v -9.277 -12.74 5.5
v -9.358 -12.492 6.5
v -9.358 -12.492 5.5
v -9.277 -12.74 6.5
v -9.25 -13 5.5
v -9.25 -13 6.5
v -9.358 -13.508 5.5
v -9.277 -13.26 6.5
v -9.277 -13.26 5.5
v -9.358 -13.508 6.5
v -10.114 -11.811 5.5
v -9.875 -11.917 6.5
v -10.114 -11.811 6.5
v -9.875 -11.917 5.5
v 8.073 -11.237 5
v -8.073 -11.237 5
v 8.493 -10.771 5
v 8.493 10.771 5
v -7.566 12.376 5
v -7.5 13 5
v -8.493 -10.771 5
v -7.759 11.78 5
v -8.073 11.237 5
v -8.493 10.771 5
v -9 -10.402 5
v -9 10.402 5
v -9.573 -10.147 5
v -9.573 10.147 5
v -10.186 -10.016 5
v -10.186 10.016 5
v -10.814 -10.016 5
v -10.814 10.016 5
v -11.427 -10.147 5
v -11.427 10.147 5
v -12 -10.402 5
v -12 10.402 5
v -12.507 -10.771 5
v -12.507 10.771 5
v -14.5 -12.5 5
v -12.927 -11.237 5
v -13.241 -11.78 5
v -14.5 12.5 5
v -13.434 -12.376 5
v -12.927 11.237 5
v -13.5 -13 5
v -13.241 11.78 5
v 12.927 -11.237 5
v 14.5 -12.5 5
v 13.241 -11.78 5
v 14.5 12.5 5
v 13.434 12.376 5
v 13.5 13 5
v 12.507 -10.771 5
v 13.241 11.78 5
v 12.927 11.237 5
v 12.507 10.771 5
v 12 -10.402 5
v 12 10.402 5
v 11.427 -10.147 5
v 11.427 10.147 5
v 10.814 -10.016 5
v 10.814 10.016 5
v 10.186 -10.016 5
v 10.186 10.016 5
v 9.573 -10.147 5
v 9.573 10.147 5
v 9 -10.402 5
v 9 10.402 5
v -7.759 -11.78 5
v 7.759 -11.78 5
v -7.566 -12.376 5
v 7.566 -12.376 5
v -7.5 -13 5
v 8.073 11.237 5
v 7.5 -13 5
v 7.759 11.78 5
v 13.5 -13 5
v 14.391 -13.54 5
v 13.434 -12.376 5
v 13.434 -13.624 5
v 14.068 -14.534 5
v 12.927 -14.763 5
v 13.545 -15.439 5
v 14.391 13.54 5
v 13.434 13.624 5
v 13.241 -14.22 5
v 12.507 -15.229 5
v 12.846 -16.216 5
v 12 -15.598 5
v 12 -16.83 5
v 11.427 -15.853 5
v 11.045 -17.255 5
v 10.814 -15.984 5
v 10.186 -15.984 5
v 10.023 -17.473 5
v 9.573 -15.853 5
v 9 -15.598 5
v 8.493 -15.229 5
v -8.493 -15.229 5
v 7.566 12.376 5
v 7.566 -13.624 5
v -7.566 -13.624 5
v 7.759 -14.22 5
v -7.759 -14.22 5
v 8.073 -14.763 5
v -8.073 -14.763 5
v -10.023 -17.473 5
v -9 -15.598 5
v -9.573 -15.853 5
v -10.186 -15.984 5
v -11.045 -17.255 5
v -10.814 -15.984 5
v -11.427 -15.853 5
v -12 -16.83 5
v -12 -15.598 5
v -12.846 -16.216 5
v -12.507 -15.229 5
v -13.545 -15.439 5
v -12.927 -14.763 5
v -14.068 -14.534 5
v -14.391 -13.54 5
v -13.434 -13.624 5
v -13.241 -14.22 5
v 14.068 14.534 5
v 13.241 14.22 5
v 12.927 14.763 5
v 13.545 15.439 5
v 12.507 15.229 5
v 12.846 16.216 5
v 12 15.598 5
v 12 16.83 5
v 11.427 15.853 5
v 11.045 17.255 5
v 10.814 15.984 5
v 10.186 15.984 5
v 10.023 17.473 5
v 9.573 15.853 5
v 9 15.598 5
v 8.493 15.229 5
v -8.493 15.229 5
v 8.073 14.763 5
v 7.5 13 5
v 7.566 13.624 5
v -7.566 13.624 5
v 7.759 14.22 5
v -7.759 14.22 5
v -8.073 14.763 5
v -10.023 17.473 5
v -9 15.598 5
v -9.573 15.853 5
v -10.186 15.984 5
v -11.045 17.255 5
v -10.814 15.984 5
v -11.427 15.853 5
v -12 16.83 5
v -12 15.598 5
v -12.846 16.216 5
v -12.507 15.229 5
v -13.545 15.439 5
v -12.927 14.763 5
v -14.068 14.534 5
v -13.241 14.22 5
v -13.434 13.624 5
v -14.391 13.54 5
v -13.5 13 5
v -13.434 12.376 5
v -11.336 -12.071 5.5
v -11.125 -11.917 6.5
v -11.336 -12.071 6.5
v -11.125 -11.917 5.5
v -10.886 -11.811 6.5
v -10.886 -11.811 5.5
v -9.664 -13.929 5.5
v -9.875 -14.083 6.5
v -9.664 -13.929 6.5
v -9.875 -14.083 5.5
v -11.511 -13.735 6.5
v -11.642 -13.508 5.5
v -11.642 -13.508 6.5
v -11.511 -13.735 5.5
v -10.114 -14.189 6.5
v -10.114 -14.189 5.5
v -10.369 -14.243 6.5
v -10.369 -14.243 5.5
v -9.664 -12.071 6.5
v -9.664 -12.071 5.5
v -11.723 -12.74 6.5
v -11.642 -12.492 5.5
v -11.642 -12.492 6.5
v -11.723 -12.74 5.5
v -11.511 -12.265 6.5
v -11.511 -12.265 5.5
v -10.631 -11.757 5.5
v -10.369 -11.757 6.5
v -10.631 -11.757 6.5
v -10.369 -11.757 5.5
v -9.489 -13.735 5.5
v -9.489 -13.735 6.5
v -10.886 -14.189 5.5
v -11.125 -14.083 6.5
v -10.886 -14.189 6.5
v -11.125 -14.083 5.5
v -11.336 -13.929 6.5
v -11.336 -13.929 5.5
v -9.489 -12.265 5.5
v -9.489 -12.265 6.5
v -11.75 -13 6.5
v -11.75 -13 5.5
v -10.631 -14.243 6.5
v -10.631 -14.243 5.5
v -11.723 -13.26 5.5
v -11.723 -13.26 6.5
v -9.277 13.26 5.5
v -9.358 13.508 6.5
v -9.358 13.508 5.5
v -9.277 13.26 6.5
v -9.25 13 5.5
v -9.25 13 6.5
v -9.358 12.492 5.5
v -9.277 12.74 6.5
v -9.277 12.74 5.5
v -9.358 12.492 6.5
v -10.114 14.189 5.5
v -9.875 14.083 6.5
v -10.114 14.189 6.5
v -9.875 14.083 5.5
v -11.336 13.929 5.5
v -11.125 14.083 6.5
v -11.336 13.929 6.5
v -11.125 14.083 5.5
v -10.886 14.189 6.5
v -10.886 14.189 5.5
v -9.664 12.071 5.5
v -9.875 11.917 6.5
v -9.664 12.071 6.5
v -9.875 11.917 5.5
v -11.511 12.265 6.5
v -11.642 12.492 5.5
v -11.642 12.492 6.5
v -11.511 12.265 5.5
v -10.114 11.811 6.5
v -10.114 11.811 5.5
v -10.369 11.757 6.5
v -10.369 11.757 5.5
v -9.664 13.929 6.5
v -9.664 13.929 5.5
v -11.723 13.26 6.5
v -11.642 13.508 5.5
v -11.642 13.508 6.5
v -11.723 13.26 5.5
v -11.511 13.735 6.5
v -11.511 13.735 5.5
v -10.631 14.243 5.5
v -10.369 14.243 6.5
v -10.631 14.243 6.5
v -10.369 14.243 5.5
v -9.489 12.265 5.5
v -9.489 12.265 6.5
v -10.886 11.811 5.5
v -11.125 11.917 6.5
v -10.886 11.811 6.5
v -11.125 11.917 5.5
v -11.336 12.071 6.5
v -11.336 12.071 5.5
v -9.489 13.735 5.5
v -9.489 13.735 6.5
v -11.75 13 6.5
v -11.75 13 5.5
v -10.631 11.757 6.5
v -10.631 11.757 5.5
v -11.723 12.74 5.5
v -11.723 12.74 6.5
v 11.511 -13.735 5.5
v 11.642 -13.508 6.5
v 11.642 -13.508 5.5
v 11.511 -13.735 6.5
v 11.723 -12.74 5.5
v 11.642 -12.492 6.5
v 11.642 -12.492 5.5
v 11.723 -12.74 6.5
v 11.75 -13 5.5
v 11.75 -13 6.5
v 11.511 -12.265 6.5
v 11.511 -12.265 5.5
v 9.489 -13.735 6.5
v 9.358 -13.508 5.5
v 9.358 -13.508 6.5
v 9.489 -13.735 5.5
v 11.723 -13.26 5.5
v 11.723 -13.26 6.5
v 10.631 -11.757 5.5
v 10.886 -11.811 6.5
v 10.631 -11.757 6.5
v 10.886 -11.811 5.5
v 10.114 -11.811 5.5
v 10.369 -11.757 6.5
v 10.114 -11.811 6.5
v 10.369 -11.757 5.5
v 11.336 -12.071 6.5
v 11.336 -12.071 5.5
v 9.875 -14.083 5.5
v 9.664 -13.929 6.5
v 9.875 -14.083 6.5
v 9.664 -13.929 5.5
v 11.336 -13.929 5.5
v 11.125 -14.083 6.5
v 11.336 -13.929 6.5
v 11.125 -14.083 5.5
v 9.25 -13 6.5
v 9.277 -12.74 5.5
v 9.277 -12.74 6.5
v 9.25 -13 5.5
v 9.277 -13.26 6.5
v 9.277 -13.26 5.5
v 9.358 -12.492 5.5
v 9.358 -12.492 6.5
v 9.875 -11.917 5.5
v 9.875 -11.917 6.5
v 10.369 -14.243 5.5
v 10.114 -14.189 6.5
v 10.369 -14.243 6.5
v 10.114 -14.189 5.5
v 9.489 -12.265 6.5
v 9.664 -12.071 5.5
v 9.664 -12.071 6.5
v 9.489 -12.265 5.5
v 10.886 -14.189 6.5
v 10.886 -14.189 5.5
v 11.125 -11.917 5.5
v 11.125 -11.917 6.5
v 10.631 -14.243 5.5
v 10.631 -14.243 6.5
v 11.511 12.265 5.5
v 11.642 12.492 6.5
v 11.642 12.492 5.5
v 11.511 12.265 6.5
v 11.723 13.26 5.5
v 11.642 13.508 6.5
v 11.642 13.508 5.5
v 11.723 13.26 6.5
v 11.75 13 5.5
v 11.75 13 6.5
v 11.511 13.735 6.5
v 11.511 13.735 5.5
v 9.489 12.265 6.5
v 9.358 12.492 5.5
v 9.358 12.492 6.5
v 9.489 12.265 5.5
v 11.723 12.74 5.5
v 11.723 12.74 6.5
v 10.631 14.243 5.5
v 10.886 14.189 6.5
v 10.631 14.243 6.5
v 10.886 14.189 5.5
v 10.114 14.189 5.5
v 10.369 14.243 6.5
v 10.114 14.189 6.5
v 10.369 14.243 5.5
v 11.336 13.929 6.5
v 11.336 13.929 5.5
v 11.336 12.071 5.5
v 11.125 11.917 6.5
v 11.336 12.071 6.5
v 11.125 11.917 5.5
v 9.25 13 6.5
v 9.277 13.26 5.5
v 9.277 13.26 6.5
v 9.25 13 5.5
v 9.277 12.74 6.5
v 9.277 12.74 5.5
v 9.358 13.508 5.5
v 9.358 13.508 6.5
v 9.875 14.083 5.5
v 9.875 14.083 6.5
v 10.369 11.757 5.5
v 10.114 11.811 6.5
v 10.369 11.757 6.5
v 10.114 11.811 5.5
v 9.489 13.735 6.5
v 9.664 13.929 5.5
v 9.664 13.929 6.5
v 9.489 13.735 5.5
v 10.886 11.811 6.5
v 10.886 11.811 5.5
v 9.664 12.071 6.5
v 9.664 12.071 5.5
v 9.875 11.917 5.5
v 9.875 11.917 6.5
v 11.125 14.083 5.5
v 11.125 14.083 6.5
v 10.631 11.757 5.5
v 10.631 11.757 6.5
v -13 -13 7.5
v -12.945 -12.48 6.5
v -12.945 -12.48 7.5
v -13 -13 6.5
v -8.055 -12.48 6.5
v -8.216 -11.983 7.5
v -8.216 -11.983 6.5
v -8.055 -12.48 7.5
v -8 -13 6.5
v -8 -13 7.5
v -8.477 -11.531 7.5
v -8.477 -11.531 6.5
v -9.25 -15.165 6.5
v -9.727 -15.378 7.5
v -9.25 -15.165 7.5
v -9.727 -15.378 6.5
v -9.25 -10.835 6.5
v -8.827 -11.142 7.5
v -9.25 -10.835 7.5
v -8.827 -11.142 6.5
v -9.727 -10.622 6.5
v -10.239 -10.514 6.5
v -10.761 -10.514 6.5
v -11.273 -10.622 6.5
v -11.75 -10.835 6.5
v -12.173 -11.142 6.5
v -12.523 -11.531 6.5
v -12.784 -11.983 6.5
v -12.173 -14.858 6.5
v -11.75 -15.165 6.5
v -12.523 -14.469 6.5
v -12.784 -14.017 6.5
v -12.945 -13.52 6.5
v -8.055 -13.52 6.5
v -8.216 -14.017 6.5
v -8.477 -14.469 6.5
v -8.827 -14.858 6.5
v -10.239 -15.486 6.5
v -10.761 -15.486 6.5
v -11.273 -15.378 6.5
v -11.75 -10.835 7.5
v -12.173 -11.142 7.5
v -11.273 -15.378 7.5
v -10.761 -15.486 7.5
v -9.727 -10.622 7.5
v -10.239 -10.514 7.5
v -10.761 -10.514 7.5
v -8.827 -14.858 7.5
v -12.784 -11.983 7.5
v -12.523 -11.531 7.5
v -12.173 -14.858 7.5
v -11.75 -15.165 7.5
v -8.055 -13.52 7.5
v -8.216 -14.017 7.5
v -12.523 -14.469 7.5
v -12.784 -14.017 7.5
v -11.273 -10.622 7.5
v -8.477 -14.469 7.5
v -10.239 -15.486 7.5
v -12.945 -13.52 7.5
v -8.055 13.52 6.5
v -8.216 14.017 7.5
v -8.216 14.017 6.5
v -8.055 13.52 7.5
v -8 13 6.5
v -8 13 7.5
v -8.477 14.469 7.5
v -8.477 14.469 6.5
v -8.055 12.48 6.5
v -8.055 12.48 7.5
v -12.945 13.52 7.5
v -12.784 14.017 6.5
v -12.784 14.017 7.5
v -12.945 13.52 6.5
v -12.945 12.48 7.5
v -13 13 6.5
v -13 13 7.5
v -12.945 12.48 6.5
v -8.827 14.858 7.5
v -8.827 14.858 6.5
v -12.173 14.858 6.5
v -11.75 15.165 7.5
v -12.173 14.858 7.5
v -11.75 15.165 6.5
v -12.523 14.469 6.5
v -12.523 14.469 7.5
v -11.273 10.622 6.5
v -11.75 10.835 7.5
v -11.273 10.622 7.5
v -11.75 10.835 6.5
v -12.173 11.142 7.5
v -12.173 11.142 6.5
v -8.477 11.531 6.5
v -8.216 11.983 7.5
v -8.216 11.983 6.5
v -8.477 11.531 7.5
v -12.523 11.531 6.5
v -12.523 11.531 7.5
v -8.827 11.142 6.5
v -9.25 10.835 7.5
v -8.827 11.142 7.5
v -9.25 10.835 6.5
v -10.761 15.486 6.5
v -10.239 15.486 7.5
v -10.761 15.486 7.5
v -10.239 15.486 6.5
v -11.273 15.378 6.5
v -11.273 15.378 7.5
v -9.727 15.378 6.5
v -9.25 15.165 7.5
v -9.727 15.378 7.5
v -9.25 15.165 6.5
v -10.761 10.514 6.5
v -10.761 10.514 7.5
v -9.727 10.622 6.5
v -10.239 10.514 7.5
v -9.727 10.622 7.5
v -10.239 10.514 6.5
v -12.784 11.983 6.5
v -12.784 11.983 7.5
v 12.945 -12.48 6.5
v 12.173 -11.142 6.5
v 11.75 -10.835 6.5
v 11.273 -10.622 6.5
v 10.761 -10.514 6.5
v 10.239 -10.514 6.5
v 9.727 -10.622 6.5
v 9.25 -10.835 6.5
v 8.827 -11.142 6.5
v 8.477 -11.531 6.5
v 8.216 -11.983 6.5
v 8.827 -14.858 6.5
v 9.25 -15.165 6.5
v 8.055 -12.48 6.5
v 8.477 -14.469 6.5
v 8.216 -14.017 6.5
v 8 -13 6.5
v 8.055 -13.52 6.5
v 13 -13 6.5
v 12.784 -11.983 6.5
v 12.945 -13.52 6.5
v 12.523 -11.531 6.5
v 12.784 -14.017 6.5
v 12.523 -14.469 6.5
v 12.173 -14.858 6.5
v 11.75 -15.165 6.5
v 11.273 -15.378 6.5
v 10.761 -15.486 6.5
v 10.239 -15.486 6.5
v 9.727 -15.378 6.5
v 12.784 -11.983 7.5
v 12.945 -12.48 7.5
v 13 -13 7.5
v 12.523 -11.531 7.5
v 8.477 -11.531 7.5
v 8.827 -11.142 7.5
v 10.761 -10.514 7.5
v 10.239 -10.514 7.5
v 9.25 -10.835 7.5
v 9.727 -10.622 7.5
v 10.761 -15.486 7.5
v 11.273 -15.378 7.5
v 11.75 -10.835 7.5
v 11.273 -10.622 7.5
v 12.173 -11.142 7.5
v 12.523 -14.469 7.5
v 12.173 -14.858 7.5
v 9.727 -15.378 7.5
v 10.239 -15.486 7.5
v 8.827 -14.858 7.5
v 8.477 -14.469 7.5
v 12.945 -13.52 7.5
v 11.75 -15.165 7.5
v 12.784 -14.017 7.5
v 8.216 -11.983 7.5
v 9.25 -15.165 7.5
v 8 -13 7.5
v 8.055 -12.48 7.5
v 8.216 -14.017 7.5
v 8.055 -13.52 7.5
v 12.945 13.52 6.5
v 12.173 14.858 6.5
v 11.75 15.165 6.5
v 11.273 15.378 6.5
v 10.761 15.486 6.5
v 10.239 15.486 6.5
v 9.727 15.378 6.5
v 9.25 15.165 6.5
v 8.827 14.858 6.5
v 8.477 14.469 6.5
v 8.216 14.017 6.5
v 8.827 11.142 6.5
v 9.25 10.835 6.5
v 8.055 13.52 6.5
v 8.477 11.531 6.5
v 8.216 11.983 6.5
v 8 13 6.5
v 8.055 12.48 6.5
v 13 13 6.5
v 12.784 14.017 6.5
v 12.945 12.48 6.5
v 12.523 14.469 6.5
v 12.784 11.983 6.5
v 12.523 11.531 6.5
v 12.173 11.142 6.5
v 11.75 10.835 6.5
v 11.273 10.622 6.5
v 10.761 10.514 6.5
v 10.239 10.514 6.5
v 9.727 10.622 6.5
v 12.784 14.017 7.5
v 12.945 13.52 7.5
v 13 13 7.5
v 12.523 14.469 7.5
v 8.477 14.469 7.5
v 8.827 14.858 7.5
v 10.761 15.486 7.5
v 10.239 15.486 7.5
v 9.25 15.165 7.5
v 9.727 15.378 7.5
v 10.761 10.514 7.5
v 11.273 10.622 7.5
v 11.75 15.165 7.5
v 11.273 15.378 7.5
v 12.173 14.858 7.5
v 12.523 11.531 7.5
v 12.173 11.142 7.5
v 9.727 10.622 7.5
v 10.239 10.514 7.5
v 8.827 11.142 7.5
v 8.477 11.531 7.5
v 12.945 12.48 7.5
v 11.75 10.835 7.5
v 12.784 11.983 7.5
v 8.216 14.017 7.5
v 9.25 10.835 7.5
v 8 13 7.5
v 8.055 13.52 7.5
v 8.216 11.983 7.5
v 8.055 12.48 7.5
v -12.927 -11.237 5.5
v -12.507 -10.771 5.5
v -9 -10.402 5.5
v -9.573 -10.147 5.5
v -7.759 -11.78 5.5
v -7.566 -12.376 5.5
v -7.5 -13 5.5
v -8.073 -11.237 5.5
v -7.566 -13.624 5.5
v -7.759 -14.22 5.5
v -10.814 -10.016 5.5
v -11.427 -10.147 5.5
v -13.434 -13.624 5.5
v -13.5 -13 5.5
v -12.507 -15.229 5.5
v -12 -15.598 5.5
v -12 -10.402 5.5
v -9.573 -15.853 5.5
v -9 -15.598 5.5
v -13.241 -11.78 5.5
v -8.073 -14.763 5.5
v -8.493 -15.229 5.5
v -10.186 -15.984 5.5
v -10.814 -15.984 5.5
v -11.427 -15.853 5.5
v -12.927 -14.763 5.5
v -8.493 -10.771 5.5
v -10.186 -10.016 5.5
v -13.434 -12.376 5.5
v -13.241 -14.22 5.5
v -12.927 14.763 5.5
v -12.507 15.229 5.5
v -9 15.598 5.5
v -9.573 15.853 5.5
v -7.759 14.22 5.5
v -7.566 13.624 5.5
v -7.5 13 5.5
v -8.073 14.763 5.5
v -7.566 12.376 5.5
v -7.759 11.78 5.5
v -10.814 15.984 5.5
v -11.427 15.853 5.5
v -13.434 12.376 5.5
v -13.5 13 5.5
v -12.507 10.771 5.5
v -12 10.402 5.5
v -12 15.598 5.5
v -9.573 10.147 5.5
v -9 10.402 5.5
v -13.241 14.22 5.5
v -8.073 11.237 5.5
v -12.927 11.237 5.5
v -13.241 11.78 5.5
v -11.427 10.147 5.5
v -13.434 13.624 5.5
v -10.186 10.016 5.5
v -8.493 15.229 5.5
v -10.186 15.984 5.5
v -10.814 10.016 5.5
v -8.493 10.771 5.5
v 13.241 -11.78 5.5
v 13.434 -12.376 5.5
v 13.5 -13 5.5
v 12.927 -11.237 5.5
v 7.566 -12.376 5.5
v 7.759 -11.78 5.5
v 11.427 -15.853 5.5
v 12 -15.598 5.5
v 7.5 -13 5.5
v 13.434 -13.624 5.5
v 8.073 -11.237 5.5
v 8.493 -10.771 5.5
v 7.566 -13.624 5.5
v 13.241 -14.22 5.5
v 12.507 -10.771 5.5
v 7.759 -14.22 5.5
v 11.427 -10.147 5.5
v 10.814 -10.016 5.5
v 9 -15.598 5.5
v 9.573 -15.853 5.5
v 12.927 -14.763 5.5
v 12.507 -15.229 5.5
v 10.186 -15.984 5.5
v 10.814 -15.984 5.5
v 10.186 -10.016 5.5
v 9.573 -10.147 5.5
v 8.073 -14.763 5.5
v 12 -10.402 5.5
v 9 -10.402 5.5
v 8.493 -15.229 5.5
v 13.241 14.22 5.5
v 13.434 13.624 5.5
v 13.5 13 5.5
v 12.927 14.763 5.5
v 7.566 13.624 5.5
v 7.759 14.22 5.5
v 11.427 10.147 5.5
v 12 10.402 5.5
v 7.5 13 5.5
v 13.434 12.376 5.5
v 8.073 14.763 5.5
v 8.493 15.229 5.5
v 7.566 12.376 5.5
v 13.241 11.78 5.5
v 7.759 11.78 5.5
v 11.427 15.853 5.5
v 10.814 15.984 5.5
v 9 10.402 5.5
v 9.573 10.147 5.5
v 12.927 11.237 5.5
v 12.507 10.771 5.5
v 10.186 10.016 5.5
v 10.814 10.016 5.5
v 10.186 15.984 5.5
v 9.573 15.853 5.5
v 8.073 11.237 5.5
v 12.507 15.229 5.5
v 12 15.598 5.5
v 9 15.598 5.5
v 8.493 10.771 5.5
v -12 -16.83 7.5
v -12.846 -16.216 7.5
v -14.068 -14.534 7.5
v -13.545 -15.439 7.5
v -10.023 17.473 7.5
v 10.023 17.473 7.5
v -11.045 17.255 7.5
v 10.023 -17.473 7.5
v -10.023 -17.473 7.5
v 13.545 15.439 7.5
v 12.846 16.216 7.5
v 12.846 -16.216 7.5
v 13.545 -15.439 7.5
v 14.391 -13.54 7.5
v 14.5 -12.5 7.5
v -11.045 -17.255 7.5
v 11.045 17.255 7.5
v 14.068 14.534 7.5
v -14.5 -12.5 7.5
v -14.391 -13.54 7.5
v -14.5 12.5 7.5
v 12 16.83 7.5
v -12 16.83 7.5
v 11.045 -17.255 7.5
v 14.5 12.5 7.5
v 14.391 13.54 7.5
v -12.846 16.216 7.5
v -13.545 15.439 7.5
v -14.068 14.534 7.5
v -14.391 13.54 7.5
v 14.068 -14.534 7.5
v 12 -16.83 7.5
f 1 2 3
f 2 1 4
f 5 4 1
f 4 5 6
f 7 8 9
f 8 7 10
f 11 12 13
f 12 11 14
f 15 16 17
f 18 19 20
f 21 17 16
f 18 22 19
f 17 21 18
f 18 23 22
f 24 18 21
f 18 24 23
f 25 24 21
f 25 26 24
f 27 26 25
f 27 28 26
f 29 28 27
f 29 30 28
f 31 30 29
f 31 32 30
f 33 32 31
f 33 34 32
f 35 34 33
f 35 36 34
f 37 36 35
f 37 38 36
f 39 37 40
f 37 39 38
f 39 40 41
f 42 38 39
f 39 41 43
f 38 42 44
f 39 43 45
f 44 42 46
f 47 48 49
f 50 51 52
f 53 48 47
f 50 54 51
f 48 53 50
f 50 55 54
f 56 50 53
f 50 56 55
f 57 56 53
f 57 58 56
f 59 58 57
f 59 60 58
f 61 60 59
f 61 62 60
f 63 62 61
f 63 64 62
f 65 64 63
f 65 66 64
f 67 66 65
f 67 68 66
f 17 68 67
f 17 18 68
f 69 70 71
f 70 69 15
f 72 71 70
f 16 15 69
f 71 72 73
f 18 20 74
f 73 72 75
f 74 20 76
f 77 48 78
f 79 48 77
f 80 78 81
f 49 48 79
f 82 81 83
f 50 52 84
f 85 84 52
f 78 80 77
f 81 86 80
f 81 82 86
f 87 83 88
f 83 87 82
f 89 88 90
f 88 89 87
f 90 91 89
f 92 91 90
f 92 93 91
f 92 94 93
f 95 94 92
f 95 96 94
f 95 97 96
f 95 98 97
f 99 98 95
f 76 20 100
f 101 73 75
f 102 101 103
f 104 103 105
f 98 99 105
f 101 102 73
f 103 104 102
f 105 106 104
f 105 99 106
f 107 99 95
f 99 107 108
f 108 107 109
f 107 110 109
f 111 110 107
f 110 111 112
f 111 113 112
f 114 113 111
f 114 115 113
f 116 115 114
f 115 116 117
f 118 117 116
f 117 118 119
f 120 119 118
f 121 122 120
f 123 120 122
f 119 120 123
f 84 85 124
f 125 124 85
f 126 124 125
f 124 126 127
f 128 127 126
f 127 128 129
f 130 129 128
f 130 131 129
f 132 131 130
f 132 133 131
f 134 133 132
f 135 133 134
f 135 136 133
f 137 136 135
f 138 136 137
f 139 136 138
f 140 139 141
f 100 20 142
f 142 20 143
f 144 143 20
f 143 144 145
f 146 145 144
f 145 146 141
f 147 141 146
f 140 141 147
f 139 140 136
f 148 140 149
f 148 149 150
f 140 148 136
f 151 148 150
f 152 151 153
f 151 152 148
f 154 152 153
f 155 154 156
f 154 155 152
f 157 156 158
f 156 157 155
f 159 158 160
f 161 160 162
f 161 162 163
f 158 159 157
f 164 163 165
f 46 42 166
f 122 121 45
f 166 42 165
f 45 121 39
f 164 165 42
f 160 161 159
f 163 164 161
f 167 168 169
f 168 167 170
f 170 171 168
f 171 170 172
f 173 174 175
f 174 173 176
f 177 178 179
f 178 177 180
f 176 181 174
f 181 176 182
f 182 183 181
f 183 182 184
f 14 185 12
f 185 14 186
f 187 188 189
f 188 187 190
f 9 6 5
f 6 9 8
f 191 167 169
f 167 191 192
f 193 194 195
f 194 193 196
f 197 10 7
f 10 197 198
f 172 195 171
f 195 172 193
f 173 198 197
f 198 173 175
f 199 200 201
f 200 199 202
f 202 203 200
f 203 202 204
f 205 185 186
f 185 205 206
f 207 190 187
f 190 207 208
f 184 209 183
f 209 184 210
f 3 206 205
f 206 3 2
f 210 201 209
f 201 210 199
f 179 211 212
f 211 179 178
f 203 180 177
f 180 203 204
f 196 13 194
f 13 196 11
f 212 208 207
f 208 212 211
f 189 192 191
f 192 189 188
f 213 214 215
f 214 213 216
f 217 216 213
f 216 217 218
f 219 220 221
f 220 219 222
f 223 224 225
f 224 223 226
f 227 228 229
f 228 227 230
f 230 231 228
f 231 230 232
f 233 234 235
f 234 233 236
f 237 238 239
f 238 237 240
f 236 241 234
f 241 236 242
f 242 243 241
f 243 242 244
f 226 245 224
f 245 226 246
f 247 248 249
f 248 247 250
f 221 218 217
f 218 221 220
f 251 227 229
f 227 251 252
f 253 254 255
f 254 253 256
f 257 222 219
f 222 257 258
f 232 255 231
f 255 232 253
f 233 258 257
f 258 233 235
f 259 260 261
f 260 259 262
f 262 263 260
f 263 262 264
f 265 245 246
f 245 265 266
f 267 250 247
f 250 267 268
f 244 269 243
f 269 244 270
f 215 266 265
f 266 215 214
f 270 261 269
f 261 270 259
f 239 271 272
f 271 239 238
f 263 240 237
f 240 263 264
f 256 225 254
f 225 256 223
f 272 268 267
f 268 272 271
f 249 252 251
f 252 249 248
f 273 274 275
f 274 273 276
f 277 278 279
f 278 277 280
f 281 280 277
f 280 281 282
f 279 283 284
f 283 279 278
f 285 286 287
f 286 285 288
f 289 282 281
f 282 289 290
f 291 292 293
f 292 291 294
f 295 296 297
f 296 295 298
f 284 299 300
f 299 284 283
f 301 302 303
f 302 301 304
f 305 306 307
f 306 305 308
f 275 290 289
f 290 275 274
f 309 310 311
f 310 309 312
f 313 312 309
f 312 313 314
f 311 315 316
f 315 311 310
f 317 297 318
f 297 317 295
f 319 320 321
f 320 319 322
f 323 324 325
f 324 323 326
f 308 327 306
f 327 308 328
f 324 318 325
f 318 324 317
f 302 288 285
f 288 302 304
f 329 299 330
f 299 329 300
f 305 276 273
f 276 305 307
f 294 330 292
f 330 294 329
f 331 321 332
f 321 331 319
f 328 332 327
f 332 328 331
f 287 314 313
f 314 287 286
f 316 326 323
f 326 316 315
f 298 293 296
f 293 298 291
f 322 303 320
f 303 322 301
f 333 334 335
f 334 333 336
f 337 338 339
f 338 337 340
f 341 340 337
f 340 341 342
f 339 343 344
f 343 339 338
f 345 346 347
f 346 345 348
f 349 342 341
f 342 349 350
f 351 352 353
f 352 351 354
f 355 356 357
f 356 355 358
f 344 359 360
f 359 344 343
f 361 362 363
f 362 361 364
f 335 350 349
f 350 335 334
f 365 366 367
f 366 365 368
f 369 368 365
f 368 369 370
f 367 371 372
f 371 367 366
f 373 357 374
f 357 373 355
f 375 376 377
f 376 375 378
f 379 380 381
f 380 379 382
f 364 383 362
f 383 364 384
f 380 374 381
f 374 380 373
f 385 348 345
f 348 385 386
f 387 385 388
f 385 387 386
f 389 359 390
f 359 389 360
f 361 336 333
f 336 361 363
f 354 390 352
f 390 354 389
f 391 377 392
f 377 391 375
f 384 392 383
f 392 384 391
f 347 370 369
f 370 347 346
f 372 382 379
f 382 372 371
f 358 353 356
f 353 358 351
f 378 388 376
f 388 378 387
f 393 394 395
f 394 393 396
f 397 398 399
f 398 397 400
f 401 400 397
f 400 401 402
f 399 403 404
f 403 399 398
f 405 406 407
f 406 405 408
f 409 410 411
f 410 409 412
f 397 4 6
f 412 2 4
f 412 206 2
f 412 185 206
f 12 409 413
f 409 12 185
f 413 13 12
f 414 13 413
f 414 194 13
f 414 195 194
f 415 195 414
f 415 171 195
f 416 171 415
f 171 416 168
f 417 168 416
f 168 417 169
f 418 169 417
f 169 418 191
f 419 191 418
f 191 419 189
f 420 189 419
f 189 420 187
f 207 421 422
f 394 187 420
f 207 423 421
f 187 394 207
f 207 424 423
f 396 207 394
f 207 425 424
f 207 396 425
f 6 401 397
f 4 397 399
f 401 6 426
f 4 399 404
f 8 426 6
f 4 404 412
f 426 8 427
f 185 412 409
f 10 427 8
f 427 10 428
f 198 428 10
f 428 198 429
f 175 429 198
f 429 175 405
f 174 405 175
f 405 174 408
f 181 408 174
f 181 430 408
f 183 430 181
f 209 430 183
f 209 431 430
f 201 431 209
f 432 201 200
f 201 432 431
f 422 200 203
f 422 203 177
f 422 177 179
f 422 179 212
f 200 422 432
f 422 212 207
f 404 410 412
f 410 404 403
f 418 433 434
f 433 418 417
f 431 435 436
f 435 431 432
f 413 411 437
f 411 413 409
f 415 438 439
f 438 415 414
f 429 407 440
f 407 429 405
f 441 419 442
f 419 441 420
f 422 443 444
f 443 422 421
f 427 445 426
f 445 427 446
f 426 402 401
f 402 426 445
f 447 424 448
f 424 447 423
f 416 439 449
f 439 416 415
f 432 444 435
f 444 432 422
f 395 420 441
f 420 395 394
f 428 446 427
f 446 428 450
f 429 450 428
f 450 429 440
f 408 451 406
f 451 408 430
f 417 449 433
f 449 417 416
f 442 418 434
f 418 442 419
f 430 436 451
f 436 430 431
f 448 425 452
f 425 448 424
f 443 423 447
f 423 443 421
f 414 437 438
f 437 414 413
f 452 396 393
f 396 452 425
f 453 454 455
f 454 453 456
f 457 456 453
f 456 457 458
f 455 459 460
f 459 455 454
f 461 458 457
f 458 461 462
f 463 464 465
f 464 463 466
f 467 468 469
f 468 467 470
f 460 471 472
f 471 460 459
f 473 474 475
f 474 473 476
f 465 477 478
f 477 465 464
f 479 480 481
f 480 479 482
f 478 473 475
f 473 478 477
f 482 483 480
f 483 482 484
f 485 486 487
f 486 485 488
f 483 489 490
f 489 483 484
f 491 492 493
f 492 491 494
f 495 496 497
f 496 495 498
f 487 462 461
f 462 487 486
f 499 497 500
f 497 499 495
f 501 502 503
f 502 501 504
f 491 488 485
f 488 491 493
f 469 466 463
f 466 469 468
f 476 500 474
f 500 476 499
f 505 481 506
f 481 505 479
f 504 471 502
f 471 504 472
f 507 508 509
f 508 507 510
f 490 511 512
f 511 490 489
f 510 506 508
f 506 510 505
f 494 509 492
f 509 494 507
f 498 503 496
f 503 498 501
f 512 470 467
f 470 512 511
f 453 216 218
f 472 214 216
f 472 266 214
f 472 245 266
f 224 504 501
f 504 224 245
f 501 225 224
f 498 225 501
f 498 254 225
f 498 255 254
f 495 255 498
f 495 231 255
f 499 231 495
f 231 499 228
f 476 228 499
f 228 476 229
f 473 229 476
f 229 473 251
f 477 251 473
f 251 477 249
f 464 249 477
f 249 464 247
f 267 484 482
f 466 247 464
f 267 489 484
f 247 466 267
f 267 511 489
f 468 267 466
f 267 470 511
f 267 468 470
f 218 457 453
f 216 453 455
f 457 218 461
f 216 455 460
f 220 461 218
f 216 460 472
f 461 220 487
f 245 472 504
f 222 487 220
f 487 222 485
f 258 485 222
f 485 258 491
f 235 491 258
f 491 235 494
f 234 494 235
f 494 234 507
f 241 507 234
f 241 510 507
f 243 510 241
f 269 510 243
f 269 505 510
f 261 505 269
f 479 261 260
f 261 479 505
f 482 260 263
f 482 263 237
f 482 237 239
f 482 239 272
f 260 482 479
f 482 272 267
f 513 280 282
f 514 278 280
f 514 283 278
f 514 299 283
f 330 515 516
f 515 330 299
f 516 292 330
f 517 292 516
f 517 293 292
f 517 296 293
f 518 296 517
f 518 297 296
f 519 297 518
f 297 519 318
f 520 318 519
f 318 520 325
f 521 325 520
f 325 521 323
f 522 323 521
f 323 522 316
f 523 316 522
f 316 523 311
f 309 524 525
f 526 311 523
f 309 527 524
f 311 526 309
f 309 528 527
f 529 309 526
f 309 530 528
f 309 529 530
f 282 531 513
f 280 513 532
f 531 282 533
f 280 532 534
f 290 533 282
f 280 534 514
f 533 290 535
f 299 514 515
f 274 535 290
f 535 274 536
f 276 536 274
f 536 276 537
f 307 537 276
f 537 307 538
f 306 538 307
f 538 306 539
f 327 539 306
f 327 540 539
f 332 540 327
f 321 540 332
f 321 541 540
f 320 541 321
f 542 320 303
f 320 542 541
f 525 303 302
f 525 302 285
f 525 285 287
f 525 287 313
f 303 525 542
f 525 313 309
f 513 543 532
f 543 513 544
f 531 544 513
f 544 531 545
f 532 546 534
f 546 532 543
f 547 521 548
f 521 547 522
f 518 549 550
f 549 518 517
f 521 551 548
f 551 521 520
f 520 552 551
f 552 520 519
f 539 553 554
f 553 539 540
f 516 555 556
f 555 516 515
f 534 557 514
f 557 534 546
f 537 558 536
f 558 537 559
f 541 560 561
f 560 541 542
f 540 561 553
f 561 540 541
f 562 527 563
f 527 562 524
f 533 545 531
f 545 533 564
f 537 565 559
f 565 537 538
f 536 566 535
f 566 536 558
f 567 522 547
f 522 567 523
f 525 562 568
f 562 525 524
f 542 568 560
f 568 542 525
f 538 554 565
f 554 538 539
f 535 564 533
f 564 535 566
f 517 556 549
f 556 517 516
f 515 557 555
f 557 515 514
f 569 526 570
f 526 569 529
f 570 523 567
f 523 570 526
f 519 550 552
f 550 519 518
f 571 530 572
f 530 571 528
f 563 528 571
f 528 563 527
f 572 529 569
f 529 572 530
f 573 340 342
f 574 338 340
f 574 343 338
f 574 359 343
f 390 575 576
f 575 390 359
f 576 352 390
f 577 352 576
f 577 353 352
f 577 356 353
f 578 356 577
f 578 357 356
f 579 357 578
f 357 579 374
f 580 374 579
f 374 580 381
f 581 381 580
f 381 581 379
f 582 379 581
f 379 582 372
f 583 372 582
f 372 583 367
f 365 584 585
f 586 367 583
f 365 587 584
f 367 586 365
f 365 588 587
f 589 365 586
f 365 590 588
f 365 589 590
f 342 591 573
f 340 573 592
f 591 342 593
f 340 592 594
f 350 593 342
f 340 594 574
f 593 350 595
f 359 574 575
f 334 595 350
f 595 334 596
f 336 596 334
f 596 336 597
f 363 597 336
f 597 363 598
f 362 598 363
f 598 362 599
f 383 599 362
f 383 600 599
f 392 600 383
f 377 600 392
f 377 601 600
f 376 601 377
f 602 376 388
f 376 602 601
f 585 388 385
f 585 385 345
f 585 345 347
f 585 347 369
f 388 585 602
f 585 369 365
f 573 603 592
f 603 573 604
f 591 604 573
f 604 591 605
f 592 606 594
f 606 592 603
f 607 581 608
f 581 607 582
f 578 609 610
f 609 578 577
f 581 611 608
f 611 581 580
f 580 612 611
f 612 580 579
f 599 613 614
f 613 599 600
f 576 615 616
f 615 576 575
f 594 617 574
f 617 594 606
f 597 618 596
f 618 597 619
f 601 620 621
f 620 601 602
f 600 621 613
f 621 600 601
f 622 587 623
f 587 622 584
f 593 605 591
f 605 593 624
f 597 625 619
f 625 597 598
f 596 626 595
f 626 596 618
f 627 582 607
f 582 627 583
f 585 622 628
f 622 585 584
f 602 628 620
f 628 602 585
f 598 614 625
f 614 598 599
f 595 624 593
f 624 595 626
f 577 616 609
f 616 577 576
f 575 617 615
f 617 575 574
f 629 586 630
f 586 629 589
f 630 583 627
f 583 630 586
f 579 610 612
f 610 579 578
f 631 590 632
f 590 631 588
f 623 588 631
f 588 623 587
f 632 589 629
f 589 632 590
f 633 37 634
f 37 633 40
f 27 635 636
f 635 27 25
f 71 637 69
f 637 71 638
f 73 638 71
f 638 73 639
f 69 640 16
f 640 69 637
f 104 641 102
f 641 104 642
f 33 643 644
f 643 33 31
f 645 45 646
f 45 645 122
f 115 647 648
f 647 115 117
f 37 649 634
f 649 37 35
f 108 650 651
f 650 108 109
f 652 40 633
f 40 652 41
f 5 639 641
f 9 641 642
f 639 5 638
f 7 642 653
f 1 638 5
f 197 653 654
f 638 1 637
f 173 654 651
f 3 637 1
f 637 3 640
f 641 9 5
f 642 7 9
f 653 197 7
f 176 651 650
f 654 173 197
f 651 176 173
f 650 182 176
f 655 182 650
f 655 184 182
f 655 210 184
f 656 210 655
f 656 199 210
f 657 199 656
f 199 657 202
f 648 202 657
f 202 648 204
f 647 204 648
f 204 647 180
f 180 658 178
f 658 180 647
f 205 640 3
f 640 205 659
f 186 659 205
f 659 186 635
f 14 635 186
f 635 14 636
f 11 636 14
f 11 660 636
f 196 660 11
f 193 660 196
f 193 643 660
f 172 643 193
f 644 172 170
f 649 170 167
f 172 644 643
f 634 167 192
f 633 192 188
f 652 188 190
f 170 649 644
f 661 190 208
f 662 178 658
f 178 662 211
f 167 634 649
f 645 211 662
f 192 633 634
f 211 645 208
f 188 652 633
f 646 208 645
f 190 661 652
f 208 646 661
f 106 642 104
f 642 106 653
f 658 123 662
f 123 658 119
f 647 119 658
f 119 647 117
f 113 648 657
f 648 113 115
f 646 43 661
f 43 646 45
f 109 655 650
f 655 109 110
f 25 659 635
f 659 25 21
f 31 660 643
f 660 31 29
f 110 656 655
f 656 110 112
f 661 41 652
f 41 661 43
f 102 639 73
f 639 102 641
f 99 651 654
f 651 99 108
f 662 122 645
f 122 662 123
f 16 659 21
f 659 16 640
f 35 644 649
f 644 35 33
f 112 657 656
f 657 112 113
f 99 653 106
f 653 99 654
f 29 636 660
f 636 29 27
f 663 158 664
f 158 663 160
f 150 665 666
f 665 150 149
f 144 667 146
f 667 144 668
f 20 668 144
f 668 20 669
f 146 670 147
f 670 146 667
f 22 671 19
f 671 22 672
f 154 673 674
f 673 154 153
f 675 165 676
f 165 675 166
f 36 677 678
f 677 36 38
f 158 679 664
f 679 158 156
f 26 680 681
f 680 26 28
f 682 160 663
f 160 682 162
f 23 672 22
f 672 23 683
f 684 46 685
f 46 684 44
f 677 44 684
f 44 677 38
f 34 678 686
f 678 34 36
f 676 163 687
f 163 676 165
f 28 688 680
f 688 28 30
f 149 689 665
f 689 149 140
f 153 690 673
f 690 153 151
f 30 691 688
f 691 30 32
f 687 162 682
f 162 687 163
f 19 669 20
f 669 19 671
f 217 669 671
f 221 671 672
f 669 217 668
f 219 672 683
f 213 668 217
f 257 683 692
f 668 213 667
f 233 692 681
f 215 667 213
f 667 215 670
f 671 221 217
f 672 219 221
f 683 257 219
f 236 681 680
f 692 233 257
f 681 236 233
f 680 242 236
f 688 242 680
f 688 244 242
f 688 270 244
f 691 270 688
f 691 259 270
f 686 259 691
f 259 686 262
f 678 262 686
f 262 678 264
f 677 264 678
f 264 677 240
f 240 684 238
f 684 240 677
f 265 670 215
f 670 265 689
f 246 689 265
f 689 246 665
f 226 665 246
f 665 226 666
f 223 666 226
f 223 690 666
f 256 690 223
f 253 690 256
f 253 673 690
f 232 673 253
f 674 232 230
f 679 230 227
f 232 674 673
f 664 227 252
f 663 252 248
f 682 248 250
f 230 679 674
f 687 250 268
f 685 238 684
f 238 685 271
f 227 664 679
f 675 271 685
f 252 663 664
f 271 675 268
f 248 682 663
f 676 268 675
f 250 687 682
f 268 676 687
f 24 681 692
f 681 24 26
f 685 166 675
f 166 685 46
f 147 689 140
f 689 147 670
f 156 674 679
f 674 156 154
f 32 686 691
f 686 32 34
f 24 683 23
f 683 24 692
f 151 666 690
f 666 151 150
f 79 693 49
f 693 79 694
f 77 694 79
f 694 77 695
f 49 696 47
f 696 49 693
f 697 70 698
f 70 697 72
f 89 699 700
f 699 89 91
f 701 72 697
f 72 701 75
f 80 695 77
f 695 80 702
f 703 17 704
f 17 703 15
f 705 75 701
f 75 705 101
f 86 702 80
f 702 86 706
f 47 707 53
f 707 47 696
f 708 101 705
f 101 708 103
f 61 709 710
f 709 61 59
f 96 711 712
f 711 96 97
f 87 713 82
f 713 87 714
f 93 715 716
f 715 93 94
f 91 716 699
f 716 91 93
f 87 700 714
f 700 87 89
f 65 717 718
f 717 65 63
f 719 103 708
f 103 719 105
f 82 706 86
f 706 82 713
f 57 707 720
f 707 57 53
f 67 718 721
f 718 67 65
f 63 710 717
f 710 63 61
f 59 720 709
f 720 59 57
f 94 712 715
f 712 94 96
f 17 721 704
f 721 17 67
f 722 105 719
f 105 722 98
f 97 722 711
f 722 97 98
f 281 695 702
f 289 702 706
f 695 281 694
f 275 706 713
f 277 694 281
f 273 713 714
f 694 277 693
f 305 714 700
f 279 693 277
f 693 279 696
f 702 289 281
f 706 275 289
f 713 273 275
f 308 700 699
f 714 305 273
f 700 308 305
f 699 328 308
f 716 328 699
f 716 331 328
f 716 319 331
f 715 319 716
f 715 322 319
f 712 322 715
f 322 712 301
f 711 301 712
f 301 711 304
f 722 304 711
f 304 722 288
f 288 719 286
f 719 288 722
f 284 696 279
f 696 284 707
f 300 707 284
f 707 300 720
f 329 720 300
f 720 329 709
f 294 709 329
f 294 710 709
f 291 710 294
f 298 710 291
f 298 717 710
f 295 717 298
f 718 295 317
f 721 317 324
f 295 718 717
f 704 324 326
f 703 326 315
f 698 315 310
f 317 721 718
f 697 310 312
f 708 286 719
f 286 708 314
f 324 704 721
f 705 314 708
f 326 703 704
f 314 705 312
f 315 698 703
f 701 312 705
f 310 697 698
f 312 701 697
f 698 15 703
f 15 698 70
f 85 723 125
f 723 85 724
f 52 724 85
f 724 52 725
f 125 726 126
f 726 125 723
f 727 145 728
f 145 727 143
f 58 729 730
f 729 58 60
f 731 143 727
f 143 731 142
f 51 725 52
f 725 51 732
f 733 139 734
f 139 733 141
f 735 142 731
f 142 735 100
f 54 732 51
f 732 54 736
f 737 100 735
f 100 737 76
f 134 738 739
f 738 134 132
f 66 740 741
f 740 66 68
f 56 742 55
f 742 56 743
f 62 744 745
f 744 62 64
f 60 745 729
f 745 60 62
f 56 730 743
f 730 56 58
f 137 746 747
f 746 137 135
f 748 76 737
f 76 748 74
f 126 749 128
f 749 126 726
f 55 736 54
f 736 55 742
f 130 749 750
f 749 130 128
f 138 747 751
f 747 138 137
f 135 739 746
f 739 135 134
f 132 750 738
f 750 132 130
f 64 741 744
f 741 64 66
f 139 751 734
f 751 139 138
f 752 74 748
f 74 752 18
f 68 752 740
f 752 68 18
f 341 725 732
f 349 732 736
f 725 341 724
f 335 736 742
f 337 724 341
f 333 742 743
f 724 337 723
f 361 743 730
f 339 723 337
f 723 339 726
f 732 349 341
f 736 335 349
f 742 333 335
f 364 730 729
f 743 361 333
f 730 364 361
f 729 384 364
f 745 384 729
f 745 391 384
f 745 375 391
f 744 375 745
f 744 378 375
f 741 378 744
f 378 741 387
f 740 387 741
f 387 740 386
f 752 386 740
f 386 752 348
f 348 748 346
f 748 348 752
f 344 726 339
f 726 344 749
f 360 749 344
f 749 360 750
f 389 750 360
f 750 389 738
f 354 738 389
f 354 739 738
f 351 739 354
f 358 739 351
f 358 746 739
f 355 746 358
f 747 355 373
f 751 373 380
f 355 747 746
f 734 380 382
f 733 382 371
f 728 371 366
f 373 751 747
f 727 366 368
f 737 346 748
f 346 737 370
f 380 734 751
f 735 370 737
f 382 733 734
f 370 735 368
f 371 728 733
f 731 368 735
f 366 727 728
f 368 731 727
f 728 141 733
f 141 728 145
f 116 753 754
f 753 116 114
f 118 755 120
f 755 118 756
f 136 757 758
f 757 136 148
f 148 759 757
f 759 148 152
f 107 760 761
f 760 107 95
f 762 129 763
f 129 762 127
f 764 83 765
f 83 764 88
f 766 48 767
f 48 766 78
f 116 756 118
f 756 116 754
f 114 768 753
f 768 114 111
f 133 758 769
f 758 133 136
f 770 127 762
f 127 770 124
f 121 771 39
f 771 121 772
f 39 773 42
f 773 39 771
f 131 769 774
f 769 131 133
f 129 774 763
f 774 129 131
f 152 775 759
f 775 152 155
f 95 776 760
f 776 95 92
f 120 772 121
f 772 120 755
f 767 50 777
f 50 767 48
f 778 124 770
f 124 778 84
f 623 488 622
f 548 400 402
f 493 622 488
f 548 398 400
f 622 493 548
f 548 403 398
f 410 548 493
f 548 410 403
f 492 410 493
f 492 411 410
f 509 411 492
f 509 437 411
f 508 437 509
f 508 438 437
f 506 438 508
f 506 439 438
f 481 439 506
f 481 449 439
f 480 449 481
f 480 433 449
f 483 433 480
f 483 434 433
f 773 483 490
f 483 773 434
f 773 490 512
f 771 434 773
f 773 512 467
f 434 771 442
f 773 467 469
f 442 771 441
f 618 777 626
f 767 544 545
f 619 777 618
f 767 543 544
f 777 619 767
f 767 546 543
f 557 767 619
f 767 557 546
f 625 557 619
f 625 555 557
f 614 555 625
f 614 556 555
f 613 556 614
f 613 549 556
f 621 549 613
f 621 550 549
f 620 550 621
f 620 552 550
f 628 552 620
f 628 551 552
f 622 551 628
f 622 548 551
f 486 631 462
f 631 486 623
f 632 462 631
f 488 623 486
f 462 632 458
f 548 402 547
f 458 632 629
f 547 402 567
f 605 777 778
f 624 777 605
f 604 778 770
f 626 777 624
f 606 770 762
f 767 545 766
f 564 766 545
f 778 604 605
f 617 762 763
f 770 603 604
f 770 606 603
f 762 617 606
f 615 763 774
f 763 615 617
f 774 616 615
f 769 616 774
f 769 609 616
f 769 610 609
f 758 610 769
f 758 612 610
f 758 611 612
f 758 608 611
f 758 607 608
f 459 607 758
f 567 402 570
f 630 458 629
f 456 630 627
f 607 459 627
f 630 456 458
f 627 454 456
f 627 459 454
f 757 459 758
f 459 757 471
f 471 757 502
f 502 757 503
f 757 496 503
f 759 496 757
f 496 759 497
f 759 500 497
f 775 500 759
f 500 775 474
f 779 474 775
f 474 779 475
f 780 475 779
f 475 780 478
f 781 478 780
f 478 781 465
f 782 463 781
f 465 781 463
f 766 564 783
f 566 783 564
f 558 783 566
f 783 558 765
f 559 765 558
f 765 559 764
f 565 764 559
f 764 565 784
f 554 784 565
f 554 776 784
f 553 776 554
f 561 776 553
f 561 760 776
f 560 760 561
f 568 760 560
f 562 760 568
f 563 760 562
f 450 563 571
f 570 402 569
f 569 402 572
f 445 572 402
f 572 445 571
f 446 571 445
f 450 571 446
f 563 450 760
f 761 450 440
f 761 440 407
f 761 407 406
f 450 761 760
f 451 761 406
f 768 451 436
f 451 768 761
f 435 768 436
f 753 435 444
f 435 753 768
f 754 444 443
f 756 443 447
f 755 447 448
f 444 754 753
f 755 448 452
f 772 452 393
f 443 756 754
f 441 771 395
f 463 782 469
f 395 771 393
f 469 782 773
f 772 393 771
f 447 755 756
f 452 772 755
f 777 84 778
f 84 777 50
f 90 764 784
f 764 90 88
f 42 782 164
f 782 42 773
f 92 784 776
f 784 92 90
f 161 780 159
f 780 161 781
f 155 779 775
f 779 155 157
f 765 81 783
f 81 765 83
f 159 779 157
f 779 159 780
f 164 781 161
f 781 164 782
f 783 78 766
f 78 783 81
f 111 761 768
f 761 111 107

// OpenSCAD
WIDTH = 29;
LENGTH = 35;
CORNER_DIA = 10;
THICKNESS_BOT = 2;
THICKNESS_TOP = 2.5;

MOUNT_HOLE_SPACING_X = 21;
MOUNT_HOLE_SPACING_Y = 26;
MOUNT_HOLE_DIA = 2.5;
MOUNT_HOLE_SHAFT_DIA = 5;
MOUNT_HOLE_HEAD_DIA = 5;
MOUNT_HOLE_SHAFT_LENGTH = 1;
MOUNT_HOLE_HEAD_LENGTH = 1;

$fn = 30;

module mount_holes(width, length, height, dia) {
  for(i = [-1, 1]) {
    for(j = [-1, 1]) {
      translate([i * width/2, j * length/2, 0])
      cylinder(d = dia, h = height);
    }
  }
}

module rounded_rect(width, length, height, corner_dia) {
  hull()
  mount_holes(width - corner_dia, length - corner_dia, height, corner_dia);
}

module bottom() {
  difference() {
    union() {
      rounded_rect(WIDTH, LENGTH, THICKNESS_BOT, CORNER_DIA);
      translate([0, 0, THICKNESS_BOT])
      mount_holes(MOUNT_HOLE_SPACING_X, MOUNT_HOLE_SPACING_Y, MOUNT_HOLE_SHAFT_LENGTH, MOUNT_HOLE_SHAFT_DIA);
    }
    mount_holes(MOUNT_HOLE_SPACING_X, MOUNT_HOLE_SPACING_Y, THICKNESS_BOT + MOUNT_HOLE_SHAFT_LENGTH, MOUNT_HOLE_DIA);
  }
}

module top() {
  difference() {
    rounded_rect(WIDTH, LENGTH, THICKNESS_TOP, CORNER_DIA);
    mount_holes(MOUNT_HOLE_SPACING_X, MOUNT_HOLE_SPACING_Y, THICKNESS_BOT, MOUNT_HOLE_DIA);

    translate([0, 0, THICKNESS_TOP - MOUNT_HOLE_HEAD_LENGTH])
    mount_holes(MOUNT_HOLE_SPACING_X, MOUNT_HOLE_SPACING_Y, THICKNESS_BOT, MOUNT_HOLE_HEAD_DIA);

    mount_holes(MOUNT_HOLE_SPACING_X, MOUNT_HOLE_SPACING_Y, MOUNT_HOLE_SHAFT_LENGTH/2, MOUNT_HOLE_SHAFT_DIA + 1);
  }
}

//bottom();
translate([0, 0, 5])
top();
